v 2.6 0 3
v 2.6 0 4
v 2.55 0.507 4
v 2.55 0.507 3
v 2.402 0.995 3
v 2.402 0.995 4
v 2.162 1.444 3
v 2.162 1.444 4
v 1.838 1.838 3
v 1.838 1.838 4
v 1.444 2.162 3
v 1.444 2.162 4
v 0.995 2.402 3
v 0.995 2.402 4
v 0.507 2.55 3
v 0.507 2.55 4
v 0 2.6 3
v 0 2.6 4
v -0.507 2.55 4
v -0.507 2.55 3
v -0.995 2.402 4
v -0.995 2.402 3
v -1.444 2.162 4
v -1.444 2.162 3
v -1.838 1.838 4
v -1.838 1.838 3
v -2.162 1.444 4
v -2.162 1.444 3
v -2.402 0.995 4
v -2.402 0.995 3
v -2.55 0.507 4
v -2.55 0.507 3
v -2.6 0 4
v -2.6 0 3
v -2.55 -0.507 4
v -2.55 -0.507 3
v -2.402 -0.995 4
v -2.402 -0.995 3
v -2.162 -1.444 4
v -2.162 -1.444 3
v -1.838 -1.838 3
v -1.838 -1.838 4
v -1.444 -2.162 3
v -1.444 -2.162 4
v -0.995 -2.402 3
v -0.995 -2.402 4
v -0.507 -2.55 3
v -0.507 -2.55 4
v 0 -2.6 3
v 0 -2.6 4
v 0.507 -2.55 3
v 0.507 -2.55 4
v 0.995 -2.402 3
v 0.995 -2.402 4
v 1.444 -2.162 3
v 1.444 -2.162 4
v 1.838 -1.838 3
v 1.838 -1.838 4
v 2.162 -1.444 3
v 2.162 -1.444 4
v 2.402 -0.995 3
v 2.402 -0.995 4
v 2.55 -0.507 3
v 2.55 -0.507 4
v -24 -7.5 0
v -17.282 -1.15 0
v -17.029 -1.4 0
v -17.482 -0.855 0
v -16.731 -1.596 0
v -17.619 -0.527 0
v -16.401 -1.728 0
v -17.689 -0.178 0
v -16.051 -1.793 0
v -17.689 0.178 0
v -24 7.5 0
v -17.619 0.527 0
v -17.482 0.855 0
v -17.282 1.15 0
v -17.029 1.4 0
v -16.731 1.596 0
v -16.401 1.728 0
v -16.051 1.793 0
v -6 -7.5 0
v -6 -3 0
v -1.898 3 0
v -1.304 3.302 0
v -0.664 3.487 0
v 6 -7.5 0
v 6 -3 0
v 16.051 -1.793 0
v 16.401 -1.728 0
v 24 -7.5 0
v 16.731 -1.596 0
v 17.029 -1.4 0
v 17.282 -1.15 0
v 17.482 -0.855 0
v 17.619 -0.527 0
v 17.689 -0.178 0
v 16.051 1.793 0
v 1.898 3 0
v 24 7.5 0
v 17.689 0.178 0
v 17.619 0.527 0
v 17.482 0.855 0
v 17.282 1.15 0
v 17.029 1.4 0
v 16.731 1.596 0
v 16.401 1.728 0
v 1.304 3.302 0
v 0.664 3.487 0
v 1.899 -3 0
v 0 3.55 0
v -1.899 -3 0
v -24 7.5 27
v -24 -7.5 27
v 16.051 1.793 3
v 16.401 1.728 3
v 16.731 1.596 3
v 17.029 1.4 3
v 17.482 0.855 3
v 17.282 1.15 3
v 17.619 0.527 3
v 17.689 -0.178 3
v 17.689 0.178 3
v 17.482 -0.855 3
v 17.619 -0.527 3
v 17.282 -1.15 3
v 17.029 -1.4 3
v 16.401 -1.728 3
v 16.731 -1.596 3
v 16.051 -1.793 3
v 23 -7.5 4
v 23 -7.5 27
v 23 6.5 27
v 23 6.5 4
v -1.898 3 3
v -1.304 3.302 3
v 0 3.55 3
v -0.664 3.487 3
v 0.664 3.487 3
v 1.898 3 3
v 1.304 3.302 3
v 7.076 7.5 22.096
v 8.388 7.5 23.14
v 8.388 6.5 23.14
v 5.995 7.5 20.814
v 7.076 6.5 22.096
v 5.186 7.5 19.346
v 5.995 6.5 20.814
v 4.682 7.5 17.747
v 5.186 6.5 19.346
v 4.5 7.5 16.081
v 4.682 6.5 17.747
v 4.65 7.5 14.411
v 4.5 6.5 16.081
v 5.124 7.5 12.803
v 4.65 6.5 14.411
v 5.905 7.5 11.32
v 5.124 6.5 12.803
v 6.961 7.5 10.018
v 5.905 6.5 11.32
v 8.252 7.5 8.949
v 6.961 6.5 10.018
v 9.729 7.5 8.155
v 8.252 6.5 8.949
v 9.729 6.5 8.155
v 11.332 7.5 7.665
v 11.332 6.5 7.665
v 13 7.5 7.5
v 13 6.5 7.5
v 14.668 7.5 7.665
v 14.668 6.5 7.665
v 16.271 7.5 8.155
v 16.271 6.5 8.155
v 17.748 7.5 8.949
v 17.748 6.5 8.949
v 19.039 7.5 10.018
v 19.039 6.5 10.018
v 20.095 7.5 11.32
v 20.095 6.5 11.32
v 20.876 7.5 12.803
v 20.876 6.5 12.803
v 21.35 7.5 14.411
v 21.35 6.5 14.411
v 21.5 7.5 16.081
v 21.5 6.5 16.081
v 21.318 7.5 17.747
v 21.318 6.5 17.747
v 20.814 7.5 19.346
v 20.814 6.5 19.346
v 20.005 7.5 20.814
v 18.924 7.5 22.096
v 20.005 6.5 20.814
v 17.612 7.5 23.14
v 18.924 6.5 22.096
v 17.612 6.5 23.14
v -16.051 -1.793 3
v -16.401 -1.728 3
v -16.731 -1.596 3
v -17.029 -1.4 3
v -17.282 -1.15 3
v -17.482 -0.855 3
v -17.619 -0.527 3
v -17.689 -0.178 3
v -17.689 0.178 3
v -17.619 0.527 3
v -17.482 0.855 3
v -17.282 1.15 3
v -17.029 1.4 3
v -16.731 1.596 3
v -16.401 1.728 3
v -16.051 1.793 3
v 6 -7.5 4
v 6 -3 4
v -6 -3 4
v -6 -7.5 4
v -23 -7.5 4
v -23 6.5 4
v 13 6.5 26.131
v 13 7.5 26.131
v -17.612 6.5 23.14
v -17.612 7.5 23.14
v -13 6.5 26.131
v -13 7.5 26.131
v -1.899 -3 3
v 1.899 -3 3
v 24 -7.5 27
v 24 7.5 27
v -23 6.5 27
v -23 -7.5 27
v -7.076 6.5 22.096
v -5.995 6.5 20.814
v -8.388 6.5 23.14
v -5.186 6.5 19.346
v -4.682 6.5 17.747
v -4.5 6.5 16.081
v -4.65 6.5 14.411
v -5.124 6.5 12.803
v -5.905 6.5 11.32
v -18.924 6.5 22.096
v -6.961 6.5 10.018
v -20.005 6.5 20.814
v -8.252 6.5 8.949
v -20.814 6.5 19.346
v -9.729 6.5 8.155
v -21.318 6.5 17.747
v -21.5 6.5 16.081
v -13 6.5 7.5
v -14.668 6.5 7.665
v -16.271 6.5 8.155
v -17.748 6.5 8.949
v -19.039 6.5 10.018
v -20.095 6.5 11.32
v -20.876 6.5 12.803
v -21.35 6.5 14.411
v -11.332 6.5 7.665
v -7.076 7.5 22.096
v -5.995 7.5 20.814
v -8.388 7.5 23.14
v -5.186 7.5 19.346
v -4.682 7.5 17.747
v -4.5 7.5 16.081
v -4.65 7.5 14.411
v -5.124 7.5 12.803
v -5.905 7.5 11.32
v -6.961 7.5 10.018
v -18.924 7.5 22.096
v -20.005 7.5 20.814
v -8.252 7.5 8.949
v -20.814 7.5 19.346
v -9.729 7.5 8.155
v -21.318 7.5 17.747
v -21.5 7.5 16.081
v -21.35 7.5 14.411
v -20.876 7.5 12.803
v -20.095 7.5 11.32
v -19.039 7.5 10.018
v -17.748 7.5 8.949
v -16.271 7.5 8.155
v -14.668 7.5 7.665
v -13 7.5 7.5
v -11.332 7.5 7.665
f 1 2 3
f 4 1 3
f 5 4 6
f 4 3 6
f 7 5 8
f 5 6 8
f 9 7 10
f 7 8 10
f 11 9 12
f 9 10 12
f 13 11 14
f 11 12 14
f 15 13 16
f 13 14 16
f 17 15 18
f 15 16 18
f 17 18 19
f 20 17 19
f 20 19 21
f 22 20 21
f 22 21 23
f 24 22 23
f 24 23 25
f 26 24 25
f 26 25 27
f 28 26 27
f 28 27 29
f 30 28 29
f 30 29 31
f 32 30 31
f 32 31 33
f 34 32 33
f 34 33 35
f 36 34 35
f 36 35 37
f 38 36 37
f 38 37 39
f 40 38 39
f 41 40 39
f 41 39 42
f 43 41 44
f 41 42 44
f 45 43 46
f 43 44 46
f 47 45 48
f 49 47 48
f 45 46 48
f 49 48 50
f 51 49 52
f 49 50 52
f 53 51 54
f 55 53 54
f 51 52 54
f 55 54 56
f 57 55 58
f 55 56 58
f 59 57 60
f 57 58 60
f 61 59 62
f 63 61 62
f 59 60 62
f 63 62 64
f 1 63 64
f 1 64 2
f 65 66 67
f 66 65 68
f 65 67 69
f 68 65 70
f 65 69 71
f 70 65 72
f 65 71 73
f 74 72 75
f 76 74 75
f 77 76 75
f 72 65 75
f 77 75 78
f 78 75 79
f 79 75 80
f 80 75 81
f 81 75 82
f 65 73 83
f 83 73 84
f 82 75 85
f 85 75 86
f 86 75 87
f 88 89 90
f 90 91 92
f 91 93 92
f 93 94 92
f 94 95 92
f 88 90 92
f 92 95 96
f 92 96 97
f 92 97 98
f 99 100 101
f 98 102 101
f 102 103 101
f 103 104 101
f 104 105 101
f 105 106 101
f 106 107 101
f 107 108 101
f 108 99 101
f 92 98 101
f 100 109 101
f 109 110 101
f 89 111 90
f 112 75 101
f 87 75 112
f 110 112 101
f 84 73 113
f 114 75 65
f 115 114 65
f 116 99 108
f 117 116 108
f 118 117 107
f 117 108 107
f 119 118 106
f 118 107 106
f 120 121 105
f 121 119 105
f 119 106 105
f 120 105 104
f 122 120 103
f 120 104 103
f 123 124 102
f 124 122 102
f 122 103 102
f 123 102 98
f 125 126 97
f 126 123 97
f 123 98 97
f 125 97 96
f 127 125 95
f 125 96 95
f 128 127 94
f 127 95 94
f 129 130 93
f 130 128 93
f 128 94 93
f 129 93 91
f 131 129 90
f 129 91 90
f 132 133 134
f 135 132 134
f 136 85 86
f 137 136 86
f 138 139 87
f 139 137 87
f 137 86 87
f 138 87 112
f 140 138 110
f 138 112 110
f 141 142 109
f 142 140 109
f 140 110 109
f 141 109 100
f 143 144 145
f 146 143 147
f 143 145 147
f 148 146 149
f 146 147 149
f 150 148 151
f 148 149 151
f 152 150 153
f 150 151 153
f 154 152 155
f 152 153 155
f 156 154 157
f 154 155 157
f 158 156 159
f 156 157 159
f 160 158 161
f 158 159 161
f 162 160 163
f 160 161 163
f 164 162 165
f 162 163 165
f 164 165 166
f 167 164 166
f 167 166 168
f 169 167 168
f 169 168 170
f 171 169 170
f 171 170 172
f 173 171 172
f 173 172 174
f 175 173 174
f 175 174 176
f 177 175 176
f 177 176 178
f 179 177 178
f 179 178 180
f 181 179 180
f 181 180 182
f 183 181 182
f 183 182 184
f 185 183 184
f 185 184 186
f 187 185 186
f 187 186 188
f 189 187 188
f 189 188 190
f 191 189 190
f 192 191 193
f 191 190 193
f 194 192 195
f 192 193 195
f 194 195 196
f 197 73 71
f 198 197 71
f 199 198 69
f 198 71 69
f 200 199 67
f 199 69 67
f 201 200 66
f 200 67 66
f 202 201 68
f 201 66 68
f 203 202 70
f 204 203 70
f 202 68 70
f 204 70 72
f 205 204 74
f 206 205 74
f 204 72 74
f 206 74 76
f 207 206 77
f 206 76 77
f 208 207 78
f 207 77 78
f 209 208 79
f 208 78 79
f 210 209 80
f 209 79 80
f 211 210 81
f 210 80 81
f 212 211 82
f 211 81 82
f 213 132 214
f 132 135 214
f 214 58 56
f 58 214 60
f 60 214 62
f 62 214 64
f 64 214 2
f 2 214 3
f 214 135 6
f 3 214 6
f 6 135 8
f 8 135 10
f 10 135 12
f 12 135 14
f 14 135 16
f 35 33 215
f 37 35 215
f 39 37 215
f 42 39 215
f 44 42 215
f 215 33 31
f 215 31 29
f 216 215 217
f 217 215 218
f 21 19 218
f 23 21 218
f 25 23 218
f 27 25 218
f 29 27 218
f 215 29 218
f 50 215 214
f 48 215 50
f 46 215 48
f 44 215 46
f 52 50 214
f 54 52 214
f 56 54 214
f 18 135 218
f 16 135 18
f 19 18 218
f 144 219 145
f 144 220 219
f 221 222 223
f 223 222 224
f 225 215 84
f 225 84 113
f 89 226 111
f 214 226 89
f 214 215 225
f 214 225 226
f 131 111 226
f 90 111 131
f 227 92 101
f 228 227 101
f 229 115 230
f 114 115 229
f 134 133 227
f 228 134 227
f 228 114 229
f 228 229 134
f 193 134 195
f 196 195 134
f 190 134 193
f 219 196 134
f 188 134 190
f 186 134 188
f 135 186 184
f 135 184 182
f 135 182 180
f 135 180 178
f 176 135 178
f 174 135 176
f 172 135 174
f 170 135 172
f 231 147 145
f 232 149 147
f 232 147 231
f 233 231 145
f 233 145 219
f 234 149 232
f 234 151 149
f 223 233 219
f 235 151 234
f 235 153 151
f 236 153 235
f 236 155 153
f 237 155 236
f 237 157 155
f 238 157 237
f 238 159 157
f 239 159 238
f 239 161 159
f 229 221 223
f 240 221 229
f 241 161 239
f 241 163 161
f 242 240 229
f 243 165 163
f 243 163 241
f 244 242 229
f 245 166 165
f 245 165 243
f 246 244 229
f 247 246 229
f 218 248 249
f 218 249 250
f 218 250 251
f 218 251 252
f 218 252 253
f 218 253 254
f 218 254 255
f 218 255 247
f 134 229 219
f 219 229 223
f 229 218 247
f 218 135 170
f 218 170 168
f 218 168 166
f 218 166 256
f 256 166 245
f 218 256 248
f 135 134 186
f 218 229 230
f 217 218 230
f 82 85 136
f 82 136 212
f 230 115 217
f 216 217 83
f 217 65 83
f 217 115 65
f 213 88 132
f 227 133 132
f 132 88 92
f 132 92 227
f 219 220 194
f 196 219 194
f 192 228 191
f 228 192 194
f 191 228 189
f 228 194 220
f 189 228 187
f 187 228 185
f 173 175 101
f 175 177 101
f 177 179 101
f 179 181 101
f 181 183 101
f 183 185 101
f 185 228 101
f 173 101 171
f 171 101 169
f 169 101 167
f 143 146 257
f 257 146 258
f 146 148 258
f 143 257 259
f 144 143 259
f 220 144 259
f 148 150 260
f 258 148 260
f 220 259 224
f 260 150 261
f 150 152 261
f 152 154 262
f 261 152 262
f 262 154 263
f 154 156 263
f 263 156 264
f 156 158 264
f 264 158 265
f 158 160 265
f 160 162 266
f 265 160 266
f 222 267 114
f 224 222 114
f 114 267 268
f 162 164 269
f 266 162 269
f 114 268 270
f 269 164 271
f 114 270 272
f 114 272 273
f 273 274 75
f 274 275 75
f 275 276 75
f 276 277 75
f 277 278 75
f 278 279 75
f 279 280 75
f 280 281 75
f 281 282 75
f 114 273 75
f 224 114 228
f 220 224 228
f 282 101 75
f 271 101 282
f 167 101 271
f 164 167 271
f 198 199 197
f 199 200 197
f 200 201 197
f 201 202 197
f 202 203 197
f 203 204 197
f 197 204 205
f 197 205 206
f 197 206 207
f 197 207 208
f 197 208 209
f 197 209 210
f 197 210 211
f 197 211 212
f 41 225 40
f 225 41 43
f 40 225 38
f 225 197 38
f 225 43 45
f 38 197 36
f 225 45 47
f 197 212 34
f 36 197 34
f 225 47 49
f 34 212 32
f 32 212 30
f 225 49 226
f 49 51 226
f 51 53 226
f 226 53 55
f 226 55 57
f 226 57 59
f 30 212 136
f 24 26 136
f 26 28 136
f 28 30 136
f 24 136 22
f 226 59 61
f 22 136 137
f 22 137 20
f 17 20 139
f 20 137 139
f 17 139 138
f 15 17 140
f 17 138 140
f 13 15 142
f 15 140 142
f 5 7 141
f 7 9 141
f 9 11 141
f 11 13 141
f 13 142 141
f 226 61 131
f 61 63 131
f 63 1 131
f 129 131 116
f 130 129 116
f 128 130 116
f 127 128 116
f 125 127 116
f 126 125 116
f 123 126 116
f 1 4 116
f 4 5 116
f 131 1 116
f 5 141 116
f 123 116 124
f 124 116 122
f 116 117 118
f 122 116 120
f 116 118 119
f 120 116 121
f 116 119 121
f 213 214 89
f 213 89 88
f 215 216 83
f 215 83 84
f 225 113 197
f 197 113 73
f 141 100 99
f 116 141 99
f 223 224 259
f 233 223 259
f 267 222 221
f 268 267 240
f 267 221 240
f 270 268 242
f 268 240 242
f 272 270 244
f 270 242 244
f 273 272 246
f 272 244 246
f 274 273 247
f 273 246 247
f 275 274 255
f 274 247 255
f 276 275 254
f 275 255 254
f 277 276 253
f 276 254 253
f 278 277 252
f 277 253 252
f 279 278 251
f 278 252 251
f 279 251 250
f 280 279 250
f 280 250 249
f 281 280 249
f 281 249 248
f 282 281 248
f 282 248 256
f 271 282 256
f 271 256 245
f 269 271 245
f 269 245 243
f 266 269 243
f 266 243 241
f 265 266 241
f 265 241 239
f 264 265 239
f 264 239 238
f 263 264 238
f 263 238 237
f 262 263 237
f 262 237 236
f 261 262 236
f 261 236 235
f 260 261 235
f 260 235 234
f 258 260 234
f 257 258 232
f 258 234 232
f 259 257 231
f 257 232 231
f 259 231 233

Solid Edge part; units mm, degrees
sketch "Sketch1" plane through (0, 0, 0) normal (0, 0, 1) x (1, 0, 0)
  line L0 (-24, -7.5) -> (24, -7.5)
  line L1 (24, -7.5) -> (24, 7.5)
  line L2 (24, 7.5) -> (-24, 7.5)
  line L3 (-24, 7.5) -> (-24, -7.5)
  dimension "D1" = 48
  dimension "D2" = 15
extrude "Protrusion1" add sketch "Sketch1" along normal blind 5
sketch "Sketch2" plane through (0, 0, 5) normal (0, 0, 1) x (1, 0, 0)
  line L0 (-24, -7.5) -> (24, -7.5)
  line L1 (24, -7.5) -> (24, 7.5)
  line L2 (24, 7.5) -> (-24, 7.5)
  line L3 (-24, 7.5) -> (-24, -7.5)
extrude "ProtrusiónExtruida_5" add sketch "Sketch2" along normal blind 22
shell "Espesor_3" thickness 1 removed faces 2 at (-16.48, -7.5, 22.23) at (-16.48, -4.85, 27)
sketch "Sketch3" plane through (0, -0.5, 1) normal (0, 0, 1) x (1, 0, 0)
  line L0 (-23, -7) -> (-23, 7)
  line L1 (-23, 7) -> (23, 7)
  line L2 (23, 7) -> (23, -7)
  line L3 (23, -7) -> (-23, -7)
extrude "ProtrusiónExtruida_6" add sketch "Sketch3" along normal blind 3
sketch "Sketch4" plane through (0, 0, 0) normal (0, 0, -1) x (1, 0, 0)
  arc A0 (-1.8978, 3.0001) -> (1.8978, 3.0001) centre (0, 0) cw
  line L0 (1.8978, 3.0001) -> (16.0507, 1.7935)
  arc A1 (16.0507, 1.7935) -> (16.0507, -1.7935) centre (15.8978, 0) cw
  line L1 (1.8982, -2.9999) -> (16.0507, -1.7935)
  arc A2 (1.8982, -2.9999) -> (-1.8982, -2.9999) centre (0, 0) cw
  line L2 (-1.8982, -2.9999) -> (-16.0507, -1.7935)
  arc A3 (-16.0507, 1.7935) -> (-16.0507, -1.7935) centre (-15.8978, 0) ccw
  line L3 (-1.8978, 3.0001) -> (-16.0507, 1.7935)
  dimension "D1" = 1.8
  dimension "D2" = 0.0004
  dimension "D3" = 7.1
  dimension "D4" = 6
  dimension "D5" = 1.8
  dimension "D6" = 14
  dimension "D7" = 14
extrude "VaciadoExtruido_1" cut sketch "Sketch4" against normal blind 3
hole "Agujero_2" at (0, 0, 4) direction (0, 0, -1) diameter 2.1 end up to next
sketch "Sketch5" plane through (0, -0.5, 4) normal (0, 0, 1) x (1, 0, 0)
  circle A0 centre (0, 0.5) radius 2.6
  dimension "D1" = 5.2
extrude "VaciadoExtruido_4" cut sketch "Sketch5" against normal blind 1.4
sketch "Sketch6" plane through (0, -0.5, 4) normal (0, 0, 1) x (1, 0, 0)
  line L0 (-6, -7) -> (-6, -2.5)
  line L1 (-6, -2.5) -> (6, -2.5)
  line L2 (6, -2.5) -> (6, -7)
  line L3 (6, -7) -> (-6, -7)
  dimension "D1" = 4.5
  dimension "D2" = 12
extrude "Cutout1" cut sketch "Sketch6" against normal up to next
hole "Agujero_3" at (13, 6.5, 16) direction (0, 1, 0) diameter 17 end up to next
hole "Hole1" at (-13, 6.5, 16) direction (0, 1, 0) diameter 17 end up to next
sketch "Sketch7" plane through (0, 7.5, 13.5) normal (0, 1, 0) x (-1, 0, 0)
  line L0 (-13, 12.6313) -> (-8.3746, 9.6313)
  line L1 (-17.6254, 9.6313) -> (-8.3746, 9.6313)
  line L2 (-13, 12.6313) -> (-17.6254, 9.6313)
  line L3 (13, 12.6313) -> (8.3746, 9.6313)
  line L4 (8.3746, 9.6313) -> (17.6254, 9.6313)
  line L5 (17.6254, 9.6313) -> (13, 12.6313)
  dimension "D1" = 3
extrude "Cutout2" cut sketch "Sketch7" against normal up to next
